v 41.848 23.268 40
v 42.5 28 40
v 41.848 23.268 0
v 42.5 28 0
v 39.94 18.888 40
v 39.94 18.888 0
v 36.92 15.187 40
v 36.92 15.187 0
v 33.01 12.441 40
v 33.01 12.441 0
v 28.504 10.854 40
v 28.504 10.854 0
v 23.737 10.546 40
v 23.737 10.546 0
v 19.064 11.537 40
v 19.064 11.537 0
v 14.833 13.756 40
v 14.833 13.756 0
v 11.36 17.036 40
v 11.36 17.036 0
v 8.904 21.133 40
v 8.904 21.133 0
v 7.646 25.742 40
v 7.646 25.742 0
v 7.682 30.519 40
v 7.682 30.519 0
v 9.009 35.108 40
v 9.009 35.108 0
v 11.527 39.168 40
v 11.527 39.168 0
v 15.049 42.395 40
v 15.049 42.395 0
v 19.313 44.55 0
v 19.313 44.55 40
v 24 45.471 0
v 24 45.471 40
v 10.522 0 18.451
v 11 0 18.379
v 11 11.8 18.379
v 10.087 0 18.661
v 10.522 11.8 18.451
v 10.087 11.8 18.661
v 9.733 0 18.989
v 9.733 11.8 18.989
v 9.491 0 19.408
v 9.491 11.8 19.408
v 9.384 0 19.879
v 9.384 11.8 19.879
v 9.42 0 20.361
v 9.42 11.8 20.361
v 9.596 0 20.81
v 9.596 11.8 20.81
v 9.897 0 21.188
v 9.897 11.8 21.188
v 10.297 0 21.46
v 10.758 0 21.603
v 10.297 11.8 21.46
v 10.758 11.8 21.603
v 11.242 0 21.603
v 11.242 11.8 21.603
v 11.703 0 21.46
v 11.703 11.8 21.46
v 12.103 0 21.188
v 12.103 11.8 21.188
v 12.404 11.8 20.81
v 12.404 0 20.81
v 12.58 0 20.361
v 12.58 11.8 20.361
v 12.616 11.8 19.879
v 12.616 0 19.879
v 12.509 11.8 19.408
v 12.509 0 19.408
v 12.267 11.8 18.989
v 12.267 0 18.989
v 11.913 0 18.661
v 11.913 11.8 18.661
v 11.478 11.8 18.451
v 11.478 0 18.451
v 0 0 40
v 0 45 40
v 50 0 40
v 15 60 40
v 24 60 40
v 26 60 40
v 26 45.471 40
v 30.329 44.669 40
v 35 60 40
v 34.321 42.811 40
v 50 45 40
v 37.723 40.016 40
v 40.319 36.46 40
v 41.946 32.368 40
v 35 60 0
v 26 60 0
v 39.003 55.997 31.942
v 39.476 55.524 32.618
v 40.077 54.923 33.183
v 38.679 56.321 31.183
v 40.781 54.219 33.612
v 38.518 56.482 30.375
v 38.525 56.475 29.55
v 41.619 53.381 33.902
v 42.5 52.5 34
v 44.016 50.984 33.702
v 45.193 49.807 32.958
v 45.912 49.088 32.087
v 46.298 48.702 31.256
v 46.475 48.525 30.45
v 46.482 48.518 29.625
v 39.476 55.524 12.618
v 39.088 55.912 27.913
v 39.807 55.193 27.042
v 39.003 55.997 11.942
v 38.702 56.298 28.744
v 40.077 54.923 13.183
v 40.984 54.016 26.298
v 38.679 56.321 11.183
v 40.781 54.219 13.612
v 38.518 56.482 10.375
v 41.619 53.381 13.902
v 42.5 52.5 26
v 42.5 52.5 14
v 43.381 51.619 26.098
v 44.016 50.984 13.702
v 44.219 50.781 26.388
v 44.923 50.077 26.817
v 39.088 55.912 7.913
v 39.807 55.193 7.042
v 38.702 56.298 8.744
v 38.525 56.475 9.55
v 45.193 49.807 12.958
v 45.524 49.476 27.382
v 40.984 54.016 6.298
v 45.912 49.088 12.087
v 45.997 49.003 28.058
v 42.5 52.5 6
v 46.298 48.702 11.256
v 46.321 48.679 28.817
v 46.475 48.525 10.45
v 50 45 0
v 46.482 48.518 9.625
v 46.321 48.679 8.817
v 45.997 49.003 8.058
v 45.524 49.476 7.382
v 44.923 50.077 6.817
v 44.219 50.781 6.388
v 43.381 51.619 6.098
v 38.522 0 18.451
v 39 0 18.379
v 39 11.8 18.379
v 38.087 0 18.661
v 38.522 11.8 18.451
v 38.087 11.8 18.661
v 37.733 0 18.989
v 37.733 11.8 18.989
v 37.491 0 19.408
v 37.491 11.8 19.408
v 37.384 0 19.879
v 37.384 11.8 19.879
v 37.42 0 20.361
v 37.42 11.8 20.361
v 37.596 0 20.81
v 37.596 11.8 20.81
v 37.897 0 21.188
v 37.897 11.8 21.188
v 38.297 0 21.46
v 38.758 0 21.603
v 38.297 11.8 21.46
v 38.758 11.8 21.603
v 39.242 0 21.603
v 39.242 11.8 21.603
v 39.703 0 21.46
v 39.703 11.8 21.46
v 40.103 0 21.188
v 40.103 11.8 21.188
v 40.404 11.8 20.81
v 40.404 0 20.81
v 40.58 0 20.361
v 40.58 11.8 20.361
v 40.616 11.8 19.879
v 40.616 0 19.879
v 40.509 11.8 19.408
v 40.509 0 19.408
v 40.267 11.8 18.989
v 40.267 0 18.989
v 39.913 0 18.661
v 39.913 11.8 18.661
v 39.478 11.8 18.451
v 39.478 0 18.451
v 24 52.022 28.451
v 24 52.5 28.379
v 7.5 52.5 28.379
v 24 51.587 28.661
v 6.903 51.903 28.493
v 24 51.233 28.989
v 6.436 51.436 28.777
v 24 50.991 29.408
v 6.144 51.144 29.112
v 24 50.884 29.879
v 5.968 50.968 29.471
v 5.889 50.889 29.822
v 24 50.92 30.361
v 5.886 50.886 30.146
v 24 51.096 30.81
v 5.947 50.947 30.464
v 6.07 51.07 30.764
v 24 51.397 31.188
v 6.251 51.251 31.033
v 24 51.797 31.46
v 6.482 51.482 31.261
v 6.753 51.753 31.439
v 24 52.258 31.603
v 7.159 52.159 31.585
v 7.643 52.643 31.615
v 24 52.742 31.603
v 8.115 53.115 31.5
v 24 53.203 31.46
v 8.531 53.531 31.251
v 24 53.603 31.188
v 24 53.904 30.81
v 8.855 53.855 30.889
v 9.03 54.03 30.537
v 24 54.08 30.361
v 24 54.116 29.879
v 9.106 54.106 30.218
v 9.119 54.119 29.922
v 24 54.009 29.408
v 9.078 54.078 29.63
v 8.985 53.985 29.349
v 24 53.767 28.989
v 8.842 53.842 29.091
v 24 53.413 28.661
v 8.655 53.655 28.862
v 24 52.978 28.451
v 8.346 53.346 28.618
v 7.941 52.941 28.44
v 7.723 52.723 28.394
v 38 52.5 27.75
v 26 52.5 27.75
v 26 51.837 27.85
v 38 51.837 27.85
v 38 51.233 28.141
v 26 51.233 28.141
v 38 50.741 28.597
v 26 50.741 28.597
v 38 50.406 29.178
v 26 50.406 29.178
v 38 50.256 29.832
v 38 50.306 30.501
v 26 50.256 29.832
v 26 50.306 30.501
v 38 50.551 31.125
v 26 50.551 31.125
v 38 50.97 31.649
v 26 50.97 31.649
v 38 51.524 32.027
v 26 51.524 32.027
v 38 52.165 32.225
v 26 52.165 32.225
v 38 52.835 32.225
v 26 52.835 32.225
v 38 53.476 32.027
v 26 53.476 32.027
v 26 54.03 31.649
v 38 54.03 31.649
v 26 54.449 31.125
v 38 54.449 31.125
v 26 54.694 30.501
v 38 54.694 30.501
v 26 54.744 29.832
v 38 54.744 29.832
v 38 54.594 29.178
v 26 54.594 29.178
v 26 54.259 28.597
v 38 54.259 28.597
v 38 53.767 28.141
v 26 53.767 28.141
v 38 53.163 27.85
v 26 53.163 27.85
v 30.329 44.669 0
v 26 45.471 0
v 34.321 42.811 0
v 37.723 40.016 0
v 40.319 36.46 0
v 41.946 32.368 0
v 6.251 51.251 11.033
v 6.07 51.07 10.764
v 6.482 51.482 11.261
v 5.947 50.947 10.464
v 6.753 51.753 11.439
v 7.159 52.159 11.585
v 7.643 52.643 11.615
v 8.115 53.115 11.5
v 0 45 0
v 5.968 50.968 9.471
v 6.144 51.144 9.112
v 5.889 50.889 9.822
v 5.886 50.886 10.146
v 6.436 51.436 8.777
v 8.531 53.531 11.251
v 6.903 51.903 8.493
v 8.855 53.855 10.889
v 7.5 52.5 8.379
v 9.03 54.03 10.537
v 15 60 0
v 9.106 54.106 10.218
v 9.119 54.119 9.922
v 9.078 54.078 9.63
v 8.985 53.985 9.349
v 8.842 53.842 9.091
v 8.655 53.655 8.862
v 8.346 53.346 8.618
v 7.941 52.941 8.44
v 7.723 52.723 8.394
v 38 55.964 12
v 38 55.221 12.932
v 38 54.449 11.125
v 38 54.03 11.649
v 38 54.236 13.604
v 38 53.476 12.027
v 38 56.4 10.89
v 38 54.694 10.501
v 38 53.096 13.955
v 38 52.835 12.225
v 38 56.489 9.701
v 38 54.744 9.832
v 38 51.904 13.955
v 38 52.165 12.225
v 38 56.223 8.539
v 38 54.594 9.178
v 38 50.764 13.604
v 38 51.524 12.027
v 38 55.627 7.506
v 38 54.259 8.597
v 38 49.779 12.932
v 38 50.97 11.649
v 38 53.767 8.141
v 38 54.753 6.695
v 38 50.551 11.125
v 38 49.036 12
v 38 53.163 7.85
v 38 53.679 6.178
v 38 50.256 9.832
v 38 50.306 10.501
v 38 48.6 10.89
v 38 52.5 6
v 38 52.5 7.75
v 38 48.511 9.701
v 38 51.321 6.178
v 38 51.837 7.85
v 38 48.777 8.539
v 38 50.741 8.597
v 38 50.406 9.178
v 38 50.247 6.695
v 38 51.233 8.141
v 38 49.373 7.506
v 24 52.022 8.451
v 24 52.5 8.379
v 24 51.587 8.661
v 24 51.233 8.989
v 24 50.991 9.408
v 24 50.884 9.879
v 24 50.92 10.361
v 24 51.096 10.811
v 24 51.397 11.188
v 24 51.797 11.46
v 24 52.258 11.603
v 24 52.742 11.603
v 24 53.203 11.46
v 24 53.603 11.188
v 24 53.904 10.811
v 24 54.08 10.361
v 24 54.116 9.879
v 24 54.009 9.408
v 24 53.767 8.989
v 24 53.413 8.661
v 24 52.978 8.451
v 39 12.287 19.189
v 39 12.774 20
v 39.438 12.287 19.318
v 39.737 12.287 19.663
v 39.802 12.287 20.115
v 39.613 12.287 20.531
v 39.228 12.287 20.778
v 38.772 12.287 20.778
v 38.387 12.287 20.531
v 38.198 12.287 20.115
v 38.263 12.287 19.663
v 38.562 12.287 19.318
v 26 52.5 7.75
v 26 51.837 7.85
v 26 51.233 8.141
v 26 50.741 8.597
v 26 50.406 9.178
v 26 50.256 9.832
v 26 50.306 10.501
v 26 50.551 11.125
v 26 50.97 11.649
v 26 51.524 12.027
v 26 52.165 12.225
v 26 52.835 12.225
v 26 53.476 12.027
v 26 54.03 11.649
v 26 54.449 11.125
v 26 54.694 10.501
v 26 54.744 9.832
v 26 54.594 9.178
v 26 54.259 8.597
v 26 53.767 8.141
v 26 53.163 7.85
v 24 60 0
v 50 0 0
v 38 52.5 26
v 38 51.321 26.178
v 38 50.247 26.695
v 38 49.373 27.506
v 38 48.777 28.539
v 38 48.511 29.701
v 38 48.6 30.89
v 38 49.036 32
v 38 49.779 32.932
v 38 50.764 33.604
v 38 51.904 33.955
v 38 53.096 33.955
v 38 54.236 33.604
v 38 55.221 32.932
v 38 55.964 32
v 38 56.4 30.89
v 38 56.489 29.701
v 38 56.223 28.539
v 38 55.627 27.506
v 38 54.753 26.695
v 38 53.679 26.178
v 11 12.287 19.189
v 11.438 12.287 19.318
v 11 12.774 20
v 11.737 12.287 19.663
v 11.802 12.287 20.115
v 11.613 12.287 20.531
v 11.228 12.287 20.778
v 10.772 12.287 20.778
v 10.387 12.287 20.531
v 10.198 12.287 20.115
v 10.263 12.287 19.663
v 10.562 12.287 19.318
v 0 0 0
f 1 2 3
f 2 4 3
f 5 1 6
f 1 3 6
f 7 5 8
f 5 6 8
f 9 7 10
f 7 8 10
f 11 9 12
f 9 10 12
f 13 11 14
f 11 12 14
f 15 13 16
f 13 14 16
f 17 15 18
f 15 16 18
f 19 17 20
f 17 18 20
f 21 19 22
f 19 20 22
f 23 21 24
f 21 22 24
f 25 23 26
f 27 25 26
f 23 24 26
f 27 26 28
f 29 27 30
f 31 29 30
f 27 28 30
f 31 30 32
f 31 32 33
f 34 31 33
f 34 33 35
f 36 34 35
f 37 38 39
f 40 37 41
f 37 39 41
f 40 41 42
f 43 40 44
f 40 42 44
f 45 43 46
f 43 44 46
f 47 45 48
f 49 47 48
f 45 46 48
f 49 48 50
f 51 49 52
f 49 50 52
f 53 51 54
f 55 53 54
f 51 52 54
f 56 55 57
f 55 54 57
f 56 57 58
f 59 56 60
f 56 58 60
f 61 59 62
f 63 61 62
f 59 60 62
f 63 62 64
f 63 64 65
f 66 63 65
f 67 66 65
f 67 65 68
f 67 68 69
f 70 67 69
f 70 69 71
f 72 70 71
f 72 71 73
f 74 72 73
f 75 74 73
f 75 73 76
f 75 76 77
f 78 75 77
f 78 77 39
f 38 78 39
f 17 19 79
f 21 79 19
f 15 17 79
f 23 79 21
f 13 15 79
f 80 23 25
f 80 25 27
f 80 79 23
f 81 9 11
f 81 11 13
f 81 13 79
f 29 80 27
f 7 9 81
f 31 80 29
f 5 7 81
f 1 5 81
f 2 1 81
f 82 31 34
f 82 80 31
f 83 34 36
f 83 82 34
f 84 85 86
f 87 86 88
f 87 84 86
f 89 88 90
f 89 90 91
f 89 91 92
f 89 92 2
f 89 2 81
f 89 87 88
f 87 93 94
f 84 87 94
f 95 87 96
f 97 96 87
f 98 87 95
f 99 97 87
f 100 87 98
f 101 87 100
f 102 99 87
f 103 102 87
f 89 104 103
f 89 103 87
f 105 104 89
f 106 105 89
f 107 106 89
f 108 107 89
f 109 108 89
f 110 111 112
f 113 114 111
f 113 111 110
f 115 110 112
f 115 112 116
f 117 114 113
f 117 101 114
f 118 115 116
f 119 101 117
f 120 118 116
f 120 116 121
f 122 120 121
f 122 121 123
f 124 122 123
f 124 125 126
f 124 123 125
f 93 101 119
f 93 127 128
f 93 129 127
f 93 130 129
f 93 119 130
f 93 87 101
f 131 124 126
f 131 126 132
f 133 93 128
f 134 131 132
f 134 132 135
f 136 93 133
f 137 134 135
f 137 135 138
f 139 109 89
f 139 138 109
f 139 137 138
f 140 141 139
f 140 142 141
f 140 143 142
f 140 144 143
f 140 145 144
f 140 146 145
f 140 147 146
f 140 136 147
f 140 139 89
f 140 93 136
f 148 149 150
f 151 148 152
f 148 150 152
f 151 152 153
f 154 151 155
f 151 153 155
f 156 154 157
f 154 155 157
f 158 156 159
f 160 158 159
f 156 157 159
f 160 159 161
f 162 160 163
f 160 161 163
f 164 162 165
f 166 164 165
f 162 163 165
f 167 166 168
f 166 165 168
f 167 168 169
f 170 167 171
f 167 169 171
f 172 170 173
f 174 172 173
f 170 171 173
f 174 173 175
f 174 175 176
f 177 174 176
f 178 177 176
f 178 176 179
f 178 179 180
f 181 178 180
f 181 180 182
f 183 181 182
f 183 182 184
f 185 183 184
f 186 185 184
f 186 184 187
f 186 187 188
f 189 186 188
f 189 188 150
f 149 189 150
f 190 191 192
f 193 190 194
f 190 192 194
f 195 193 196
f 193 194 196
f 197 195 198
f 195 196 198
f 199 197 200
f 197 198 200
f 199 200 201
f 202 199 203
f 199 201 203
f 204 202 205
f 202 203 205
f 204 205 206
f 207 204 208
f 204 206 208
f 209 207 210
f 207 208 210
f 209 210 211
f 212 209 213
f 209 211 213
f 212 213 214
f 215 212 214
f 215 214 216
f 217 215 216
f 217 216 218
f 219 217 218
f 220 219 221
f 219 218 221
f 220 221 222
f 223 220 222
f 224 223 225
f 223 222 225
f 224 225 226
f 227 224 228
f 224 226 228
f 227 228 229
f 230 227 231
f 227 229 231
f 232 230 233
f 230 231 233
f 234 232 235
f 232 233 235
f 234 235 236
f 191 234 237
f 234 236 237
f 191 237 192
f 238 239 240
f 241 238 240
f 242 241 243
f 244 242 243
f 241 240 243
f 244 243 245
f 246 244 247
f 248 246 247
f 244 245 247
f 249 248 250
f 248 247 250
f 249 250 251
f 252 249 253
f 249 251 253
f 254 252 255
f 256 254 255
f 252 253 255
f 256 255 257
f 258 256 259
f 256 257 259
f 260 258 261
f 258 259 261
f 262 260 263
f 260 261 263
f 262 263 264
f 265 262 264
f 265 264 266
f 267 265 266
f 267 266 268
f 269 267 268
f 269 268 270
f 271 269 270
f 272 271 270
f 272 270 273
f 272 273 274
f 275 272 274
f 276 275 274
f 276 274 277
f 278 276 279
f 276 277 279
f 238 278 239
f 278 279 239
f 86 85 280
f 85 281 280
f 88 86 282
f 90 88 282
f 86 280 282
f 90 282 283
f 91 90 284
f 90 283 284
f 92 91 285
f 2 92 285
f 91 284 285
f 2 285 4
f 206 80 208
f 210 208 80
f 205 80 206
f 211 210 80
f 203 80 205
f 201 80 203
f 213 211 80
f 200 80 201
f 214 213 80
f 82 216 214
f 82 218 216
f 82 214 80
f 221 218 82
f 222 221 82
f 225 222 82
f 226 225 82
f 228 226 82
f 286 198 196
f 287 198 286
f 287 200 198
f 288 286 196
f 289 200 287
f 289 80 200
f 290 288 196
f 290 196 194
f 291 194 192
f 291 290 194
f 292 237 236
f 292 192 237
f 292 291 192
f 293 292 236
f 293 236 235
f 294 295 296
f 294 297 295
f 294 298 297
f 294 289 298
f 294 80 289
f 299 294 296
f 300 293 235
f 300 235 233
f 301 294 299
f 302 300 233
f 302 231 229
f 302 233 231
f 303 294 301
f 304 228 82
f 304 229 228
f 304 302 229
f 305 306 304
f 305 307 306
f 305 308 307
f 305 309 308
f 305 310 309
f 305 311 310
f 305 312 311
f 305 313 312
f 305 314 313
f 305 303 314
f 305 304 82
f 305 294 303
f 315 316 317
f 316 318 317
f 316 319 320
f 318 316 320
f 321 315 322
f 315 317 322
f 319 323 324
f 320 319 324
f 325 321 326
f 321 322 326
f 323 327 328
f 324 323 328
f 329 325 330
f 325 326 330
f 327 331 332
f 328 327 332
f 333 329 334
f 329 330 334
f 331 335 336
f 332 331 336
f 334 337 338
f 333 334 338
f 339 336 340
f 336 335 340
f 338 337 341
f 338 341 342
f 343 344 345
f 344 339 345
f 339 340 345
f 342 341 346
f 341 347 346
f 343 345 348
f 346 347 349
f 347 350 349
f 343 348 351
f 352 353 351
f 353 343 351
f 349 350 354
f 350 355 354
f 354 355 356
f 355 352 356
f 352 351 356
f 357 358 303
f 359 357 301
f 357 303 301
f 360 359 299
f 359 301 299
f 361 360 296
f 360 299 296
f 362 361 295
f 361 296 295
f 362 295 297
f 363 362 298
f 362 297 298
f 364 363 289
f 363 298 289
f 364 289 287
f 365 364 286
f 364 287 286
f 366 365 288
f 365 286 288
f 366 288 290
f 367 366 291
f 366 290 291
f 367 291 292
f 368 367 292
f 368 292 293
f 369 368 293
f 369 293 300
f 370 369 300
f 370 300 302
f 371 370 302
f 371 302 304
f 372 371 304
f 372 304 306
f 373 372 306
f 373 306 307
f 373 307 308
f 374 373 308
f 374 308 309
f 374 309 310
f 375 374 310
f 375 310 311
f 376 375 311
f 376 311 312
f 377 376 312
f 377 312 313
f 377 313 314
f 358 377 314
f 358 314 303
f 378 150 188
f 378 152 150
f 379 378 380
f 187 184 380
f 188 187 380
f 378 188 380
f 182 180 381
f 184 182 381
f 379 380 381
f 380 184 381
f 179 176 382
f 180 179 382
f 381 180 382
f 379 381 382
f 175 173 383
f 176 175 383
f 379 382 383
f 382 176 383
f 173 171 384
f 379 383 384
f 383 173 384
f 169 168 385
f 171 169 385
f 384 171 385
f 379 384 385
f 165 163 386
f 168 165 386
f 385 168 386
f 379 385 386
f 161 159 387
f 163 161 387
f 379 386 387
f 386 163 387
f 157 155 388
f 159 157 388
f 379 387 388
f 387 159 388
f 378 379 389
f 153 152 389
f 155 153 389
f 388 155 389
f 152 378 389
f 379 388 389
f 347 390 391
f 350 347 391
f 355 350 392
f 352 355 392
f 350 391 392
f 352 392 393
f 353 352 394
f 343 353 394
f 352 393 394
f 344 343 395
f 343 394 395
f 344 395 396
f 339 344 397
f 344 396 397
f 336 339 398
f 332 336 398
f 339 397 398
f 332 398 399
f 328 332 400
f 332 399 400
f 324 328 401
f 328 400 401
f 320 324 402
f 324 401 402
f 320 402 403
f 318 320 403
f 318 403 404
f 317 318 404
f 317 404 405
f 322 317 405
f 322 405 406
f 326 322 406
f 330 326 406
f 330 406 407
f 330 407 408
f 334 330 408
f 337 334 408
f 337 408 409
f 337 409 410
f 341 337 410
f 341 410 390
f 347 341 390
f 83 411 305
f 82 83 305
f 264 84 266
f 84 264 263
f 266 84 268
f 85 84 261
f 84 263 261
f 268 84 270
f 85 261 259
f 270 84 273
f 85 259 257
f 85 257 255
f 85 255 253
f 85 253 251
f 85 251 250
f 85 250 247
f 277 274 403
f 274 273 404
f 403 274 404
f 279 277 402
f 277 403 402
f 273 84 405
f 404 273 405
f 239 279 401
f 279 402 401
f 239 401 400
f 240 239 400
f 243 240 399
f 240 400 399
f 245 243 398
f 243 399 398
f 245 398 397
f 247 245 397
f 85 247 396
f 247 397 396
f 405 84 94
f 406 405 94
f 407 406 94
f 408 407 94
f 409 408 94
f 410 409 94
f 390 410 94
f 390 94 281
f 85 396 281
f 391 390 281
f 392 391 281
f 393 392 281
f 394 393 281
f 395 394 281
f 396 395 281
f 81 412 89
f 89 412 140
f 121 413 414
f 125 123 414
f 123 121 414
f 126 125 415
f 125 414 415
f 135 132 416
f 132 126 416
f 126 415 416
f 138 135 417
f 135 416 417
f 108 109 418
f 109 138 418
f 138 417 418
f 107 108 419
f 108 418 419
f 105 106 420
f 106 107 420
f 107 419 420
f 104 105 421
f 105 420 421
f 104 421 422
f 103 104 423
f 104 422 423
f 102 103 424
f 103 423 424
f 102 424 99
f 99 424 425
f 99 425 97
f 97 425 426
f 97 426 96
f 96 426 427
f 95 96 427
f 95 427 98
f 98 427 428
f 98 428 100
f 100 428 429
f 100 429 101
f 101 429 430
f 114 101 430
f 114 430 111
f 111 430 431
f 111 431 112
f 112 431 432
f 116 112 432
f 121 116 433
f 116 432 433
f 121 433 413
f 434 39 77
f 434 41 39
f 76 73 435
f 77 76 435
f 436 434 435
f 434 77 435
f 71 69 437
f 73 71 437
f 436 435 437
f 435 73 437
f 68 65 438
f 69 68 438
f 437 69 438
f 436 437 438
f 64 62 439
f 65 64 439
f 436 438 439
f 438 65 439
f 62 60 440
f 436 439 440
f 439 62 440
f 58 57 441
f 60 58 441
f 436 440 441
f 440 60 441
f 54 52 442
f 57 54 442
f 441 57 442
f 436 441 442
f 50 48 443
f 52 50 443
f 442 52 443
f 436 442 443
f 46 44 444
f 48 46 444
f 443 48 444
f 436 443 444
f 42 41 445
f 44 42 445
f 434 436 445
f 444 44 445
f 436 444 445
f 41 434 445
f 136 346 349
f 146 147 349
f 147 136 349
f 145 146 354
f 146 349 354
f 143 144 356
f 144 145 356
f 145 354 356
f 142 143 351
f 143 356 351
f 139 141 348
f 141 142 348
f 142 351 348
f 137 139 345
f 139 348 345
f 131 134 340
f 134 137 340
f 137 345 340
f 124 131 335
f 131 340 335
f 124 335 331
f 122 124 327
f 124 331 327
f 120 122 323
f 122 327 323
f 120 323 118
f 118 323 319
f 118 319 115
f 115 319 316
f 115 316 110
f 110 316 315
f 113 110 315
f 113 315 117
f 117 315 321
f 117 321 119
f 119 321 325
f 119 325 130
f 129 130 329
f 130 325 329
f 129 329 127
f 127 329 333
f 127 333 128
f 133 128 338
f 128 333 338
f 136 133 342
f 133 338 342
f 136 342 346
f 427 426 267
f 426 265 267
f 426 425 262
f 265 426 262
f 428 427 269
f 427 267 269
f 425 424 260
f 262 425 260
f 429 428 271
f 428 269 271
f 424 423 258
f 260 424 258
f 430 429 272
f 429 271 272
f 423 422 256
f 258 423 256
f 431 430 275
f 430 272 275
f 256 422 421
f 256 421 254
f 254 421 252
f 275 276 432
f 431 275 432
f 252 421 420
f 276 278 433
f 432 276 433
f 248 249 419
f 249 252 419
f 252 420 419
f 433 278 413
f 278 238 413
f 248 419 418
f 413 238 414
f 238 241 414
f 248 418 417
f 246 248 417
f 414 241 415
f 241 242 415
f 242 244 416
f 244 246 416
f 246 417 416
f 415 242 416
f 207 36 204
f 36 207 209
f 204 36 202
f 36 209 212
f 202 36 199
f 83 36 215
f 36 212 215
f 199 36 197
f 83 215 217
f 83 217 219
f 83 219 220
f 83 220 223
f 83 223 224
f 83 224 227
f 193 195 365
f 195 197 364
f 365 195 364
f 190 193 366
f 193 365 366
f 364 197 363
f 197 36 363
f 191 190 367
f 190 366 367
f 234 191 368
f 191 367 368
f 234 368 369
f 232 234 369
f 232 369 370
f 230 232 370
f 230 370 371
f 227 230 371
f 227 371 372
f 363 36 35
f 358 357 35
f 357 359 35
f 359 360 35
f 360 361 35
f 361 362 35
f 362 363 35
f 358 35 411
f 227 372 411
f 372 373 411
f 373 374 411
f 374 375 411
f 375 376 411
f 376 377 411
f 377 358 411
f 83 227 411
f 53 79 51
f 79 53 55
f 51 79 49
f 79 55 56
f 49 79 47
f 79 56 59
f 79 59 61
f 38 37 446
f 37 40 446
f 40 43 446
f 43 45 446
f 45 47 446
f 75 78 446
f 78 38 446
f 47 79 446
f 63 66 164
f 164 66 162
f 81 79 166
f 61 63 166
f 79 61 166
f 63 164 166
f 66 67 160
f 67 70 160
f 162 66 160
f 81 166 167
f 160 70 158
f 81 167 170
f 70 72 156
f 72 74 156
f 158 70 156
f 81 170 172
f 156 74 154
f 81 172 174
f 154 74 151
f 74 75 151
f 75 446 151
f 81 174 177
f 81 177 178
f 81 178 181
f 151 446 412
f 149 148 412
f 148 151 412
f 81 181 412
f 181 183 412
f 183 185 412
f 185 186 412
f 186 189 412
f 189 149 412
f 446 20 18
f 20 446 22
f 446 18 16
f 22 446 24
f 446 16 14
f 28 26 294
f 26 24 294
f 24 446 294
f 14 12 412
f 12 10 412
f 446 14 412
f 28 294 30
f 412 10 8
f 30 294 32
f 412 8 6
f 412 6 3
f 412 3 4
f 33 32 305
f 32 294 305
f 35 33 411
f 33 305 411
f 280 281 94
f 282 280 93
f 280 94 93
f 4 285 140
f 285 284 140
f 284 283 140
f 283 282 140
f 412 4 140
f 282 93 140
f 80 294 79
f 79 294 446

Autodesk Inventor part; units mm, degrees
sketch "Skizze1" plane through (0, 0, 0) normal (0, 0, 1) x (1, 0, 0)
  line L0 (0, 0) -> (50, 0)
  line L1 (50, 0) -> (50, 45)
  line L2 (35, 60) -> (15, 60)
  line L3 (0, 45) -> (0, 0)
  circle A0 centre (25, 28) radius 17.5
  line L4 (25, 28) -> (25, 0) construction
  line L5 (0, 45) -> (15, 60)
  line L6 (35, 60) -> (50, 45)
  line L7 (24, 60) -> (26, 60)
  line L8 (26, 60) -> (26, 28)
  line L9 (26, 28) -> (24, 28)
  line L10 (24, 28) -> (24, 60)
  point P0 (50, 60)
  point P1 (0, 60)
  point P2 (25, 60)
  dimension "d0" = 50
  dimension "d1" = 35
  dimension "d2" = 60
  dimension "d3" = 15
  dimension "d4" = 15
  dimension "d5" = 15
  dimension "d6" = 15
  dimension "d7" = 28
  dimension "d10" = 2
extrude "Extrusion1" add sketch "Skizze1" along normal blind 40 contours L3 L5 L2 L10 A0 L8 L6 L1 L0 | L2 L8 A0 L10
extrude "Extrusion2" cut sketch "Skizze1" along normal up to surface (40 mm away) contours L2 L8 A0 L10 | A0 L8 L9 L10 picked at (24.8888, 33.8323)
sketch "Skizze2" plane through (0, 0, 0) normal (0, -1, 0) x (1, 0, 0)
  line L0 (0, 0) -> (0, 40) construction
  line L1 (50, 0) -> (50, 40) construction
  line L2 (0, 40) -> (50, 40) construction
  line L3 (0, 0) -> (0, 40) construction
  line L4 (25, 20) -> (25, 40) construction
  line L5 (7.5, 40) -> (42.5, 40) construction
  line L6 (11, 20) -> (39, 20) construction
  point P0 (26, 40)
  point P1 (24, 40)
  point P2 (0, 20)
  dimension "d13" = 28
hole "Bohrung1" at (11, 0, 20) at (39, 0, 20) direction (0, 1, 0) diameter 3.242 depth 11.8 tip angle 118 thread size "M4x0.7" class "6H" standard "ISO Metric profile"
ref_plane "Arbeitsebene1" through (42.5, 0, 0) normal (1, 0, 0) x (0, 0, -1)
sketch "Skizze3" plane through (42.5, 0, 0) normal (1, 0, 0) x (0, 0, -1)
  line L0 (0, 60) -> (-40, 60) construction
  line L1 (0, 45) -> (-40, 45) construction
  line L2 (-40, 45) -> (-40, 60) construction
  line L3 (-40, 52.5) -> (0, 52.5) construction
  line L4 (0, 45) -> (0, 60) construction
  point P0 (0, 0)
  point P1 (-20, 52.5)
  point P2 (-30, 52.5)
  point P3 (-10, 52.5)
  dimension "d44" = 10
  dimension "d45" = 10
ref_plane "Arbeitsebene2" through (0, 0, 20) normal (0, 0, 1) x (1, 0, 0)
ref_plane "Arbeitsebene3" through (0, 0, 30) normal (0, 0, 1) x (1, 0, 0)
ref_plane "Arbeitsebene4" through (0, 0, 10) normal (0, 0, -1) x (-1, 0, 0)
sketch "Skizze5" plane through (50, 0, 40) normal (1, 0, 0) x (0, 0, -1)
  line L0 (20, -12) -> (20, 72) construction
  line L1 (10, -12) -> (10, 72) construction
  line L2 (30, 72) -> (30, -12) construction
  point P0 (40, 0)
  dimension "Hole_Dist2Center" = 10
  dimension "d37" = 10
hole "Bohrung2" at (42.5, 52.5, 30) at (42.5, 52.5, 10) direction (-1, 0, 0) diameter 4.5 depth 18.5 counterbore diameter 8 counterbore depth 4.5 clearance for "Inbusschraube DIN EN ISO 4762" size "M4" standard "DIN"
delete faces "Fläche löschen1" heal yes whole lump no faces at (42.5, 52.1809, 31.2946) (42.5, 50.9777, 9.002)
sketch "Skizze4" plane through (24, 45.4714, 0) normal (1, 0, 0) x (0, 0, -1)
  line L0 (-20, 7.0286) -> (-30, 7.0286) construction
  line L1 (-30, -57.4714) -> (-30, 26.5286) construction
  line L2 (-10, 26.5286) -> (-10, -57.4714) construction
  point P0 (0, -45.4714)
  point P1 (-10, 7.0286)
hole "Bohrung3" at (24, 52.5, 30) at (24, 52.5, 10) direction (-1, 0, 0) diameter 3.242 end through all thread size "M4x0.7" class "6H" standard "ISO Metric profile"
equation "\"d0\" = Fixation_Width"
equation "\"d4\" = d3"
equation "\"d5\" = d3"
equation "\"d6\" = d5"
equation "\"d8\" = Fixation_Thickness"
equation "\"d11\" = Fixation_Thickness"
equation "\"d13\" = FixationHole_Dist"
equation "\"d44\" = Hole_Dist2Center"
equation "\"d45\" = d44"
equation "\"Fixation_Thickness\" = 40"
equation "\"Fixation_Width\" = 50"
equation "\"FixationHole_Dist\" = 28"
equation "\"d21\" = -0.5 * d5"
properties part number "Motor_MainAxis_Fixation_Holder"
